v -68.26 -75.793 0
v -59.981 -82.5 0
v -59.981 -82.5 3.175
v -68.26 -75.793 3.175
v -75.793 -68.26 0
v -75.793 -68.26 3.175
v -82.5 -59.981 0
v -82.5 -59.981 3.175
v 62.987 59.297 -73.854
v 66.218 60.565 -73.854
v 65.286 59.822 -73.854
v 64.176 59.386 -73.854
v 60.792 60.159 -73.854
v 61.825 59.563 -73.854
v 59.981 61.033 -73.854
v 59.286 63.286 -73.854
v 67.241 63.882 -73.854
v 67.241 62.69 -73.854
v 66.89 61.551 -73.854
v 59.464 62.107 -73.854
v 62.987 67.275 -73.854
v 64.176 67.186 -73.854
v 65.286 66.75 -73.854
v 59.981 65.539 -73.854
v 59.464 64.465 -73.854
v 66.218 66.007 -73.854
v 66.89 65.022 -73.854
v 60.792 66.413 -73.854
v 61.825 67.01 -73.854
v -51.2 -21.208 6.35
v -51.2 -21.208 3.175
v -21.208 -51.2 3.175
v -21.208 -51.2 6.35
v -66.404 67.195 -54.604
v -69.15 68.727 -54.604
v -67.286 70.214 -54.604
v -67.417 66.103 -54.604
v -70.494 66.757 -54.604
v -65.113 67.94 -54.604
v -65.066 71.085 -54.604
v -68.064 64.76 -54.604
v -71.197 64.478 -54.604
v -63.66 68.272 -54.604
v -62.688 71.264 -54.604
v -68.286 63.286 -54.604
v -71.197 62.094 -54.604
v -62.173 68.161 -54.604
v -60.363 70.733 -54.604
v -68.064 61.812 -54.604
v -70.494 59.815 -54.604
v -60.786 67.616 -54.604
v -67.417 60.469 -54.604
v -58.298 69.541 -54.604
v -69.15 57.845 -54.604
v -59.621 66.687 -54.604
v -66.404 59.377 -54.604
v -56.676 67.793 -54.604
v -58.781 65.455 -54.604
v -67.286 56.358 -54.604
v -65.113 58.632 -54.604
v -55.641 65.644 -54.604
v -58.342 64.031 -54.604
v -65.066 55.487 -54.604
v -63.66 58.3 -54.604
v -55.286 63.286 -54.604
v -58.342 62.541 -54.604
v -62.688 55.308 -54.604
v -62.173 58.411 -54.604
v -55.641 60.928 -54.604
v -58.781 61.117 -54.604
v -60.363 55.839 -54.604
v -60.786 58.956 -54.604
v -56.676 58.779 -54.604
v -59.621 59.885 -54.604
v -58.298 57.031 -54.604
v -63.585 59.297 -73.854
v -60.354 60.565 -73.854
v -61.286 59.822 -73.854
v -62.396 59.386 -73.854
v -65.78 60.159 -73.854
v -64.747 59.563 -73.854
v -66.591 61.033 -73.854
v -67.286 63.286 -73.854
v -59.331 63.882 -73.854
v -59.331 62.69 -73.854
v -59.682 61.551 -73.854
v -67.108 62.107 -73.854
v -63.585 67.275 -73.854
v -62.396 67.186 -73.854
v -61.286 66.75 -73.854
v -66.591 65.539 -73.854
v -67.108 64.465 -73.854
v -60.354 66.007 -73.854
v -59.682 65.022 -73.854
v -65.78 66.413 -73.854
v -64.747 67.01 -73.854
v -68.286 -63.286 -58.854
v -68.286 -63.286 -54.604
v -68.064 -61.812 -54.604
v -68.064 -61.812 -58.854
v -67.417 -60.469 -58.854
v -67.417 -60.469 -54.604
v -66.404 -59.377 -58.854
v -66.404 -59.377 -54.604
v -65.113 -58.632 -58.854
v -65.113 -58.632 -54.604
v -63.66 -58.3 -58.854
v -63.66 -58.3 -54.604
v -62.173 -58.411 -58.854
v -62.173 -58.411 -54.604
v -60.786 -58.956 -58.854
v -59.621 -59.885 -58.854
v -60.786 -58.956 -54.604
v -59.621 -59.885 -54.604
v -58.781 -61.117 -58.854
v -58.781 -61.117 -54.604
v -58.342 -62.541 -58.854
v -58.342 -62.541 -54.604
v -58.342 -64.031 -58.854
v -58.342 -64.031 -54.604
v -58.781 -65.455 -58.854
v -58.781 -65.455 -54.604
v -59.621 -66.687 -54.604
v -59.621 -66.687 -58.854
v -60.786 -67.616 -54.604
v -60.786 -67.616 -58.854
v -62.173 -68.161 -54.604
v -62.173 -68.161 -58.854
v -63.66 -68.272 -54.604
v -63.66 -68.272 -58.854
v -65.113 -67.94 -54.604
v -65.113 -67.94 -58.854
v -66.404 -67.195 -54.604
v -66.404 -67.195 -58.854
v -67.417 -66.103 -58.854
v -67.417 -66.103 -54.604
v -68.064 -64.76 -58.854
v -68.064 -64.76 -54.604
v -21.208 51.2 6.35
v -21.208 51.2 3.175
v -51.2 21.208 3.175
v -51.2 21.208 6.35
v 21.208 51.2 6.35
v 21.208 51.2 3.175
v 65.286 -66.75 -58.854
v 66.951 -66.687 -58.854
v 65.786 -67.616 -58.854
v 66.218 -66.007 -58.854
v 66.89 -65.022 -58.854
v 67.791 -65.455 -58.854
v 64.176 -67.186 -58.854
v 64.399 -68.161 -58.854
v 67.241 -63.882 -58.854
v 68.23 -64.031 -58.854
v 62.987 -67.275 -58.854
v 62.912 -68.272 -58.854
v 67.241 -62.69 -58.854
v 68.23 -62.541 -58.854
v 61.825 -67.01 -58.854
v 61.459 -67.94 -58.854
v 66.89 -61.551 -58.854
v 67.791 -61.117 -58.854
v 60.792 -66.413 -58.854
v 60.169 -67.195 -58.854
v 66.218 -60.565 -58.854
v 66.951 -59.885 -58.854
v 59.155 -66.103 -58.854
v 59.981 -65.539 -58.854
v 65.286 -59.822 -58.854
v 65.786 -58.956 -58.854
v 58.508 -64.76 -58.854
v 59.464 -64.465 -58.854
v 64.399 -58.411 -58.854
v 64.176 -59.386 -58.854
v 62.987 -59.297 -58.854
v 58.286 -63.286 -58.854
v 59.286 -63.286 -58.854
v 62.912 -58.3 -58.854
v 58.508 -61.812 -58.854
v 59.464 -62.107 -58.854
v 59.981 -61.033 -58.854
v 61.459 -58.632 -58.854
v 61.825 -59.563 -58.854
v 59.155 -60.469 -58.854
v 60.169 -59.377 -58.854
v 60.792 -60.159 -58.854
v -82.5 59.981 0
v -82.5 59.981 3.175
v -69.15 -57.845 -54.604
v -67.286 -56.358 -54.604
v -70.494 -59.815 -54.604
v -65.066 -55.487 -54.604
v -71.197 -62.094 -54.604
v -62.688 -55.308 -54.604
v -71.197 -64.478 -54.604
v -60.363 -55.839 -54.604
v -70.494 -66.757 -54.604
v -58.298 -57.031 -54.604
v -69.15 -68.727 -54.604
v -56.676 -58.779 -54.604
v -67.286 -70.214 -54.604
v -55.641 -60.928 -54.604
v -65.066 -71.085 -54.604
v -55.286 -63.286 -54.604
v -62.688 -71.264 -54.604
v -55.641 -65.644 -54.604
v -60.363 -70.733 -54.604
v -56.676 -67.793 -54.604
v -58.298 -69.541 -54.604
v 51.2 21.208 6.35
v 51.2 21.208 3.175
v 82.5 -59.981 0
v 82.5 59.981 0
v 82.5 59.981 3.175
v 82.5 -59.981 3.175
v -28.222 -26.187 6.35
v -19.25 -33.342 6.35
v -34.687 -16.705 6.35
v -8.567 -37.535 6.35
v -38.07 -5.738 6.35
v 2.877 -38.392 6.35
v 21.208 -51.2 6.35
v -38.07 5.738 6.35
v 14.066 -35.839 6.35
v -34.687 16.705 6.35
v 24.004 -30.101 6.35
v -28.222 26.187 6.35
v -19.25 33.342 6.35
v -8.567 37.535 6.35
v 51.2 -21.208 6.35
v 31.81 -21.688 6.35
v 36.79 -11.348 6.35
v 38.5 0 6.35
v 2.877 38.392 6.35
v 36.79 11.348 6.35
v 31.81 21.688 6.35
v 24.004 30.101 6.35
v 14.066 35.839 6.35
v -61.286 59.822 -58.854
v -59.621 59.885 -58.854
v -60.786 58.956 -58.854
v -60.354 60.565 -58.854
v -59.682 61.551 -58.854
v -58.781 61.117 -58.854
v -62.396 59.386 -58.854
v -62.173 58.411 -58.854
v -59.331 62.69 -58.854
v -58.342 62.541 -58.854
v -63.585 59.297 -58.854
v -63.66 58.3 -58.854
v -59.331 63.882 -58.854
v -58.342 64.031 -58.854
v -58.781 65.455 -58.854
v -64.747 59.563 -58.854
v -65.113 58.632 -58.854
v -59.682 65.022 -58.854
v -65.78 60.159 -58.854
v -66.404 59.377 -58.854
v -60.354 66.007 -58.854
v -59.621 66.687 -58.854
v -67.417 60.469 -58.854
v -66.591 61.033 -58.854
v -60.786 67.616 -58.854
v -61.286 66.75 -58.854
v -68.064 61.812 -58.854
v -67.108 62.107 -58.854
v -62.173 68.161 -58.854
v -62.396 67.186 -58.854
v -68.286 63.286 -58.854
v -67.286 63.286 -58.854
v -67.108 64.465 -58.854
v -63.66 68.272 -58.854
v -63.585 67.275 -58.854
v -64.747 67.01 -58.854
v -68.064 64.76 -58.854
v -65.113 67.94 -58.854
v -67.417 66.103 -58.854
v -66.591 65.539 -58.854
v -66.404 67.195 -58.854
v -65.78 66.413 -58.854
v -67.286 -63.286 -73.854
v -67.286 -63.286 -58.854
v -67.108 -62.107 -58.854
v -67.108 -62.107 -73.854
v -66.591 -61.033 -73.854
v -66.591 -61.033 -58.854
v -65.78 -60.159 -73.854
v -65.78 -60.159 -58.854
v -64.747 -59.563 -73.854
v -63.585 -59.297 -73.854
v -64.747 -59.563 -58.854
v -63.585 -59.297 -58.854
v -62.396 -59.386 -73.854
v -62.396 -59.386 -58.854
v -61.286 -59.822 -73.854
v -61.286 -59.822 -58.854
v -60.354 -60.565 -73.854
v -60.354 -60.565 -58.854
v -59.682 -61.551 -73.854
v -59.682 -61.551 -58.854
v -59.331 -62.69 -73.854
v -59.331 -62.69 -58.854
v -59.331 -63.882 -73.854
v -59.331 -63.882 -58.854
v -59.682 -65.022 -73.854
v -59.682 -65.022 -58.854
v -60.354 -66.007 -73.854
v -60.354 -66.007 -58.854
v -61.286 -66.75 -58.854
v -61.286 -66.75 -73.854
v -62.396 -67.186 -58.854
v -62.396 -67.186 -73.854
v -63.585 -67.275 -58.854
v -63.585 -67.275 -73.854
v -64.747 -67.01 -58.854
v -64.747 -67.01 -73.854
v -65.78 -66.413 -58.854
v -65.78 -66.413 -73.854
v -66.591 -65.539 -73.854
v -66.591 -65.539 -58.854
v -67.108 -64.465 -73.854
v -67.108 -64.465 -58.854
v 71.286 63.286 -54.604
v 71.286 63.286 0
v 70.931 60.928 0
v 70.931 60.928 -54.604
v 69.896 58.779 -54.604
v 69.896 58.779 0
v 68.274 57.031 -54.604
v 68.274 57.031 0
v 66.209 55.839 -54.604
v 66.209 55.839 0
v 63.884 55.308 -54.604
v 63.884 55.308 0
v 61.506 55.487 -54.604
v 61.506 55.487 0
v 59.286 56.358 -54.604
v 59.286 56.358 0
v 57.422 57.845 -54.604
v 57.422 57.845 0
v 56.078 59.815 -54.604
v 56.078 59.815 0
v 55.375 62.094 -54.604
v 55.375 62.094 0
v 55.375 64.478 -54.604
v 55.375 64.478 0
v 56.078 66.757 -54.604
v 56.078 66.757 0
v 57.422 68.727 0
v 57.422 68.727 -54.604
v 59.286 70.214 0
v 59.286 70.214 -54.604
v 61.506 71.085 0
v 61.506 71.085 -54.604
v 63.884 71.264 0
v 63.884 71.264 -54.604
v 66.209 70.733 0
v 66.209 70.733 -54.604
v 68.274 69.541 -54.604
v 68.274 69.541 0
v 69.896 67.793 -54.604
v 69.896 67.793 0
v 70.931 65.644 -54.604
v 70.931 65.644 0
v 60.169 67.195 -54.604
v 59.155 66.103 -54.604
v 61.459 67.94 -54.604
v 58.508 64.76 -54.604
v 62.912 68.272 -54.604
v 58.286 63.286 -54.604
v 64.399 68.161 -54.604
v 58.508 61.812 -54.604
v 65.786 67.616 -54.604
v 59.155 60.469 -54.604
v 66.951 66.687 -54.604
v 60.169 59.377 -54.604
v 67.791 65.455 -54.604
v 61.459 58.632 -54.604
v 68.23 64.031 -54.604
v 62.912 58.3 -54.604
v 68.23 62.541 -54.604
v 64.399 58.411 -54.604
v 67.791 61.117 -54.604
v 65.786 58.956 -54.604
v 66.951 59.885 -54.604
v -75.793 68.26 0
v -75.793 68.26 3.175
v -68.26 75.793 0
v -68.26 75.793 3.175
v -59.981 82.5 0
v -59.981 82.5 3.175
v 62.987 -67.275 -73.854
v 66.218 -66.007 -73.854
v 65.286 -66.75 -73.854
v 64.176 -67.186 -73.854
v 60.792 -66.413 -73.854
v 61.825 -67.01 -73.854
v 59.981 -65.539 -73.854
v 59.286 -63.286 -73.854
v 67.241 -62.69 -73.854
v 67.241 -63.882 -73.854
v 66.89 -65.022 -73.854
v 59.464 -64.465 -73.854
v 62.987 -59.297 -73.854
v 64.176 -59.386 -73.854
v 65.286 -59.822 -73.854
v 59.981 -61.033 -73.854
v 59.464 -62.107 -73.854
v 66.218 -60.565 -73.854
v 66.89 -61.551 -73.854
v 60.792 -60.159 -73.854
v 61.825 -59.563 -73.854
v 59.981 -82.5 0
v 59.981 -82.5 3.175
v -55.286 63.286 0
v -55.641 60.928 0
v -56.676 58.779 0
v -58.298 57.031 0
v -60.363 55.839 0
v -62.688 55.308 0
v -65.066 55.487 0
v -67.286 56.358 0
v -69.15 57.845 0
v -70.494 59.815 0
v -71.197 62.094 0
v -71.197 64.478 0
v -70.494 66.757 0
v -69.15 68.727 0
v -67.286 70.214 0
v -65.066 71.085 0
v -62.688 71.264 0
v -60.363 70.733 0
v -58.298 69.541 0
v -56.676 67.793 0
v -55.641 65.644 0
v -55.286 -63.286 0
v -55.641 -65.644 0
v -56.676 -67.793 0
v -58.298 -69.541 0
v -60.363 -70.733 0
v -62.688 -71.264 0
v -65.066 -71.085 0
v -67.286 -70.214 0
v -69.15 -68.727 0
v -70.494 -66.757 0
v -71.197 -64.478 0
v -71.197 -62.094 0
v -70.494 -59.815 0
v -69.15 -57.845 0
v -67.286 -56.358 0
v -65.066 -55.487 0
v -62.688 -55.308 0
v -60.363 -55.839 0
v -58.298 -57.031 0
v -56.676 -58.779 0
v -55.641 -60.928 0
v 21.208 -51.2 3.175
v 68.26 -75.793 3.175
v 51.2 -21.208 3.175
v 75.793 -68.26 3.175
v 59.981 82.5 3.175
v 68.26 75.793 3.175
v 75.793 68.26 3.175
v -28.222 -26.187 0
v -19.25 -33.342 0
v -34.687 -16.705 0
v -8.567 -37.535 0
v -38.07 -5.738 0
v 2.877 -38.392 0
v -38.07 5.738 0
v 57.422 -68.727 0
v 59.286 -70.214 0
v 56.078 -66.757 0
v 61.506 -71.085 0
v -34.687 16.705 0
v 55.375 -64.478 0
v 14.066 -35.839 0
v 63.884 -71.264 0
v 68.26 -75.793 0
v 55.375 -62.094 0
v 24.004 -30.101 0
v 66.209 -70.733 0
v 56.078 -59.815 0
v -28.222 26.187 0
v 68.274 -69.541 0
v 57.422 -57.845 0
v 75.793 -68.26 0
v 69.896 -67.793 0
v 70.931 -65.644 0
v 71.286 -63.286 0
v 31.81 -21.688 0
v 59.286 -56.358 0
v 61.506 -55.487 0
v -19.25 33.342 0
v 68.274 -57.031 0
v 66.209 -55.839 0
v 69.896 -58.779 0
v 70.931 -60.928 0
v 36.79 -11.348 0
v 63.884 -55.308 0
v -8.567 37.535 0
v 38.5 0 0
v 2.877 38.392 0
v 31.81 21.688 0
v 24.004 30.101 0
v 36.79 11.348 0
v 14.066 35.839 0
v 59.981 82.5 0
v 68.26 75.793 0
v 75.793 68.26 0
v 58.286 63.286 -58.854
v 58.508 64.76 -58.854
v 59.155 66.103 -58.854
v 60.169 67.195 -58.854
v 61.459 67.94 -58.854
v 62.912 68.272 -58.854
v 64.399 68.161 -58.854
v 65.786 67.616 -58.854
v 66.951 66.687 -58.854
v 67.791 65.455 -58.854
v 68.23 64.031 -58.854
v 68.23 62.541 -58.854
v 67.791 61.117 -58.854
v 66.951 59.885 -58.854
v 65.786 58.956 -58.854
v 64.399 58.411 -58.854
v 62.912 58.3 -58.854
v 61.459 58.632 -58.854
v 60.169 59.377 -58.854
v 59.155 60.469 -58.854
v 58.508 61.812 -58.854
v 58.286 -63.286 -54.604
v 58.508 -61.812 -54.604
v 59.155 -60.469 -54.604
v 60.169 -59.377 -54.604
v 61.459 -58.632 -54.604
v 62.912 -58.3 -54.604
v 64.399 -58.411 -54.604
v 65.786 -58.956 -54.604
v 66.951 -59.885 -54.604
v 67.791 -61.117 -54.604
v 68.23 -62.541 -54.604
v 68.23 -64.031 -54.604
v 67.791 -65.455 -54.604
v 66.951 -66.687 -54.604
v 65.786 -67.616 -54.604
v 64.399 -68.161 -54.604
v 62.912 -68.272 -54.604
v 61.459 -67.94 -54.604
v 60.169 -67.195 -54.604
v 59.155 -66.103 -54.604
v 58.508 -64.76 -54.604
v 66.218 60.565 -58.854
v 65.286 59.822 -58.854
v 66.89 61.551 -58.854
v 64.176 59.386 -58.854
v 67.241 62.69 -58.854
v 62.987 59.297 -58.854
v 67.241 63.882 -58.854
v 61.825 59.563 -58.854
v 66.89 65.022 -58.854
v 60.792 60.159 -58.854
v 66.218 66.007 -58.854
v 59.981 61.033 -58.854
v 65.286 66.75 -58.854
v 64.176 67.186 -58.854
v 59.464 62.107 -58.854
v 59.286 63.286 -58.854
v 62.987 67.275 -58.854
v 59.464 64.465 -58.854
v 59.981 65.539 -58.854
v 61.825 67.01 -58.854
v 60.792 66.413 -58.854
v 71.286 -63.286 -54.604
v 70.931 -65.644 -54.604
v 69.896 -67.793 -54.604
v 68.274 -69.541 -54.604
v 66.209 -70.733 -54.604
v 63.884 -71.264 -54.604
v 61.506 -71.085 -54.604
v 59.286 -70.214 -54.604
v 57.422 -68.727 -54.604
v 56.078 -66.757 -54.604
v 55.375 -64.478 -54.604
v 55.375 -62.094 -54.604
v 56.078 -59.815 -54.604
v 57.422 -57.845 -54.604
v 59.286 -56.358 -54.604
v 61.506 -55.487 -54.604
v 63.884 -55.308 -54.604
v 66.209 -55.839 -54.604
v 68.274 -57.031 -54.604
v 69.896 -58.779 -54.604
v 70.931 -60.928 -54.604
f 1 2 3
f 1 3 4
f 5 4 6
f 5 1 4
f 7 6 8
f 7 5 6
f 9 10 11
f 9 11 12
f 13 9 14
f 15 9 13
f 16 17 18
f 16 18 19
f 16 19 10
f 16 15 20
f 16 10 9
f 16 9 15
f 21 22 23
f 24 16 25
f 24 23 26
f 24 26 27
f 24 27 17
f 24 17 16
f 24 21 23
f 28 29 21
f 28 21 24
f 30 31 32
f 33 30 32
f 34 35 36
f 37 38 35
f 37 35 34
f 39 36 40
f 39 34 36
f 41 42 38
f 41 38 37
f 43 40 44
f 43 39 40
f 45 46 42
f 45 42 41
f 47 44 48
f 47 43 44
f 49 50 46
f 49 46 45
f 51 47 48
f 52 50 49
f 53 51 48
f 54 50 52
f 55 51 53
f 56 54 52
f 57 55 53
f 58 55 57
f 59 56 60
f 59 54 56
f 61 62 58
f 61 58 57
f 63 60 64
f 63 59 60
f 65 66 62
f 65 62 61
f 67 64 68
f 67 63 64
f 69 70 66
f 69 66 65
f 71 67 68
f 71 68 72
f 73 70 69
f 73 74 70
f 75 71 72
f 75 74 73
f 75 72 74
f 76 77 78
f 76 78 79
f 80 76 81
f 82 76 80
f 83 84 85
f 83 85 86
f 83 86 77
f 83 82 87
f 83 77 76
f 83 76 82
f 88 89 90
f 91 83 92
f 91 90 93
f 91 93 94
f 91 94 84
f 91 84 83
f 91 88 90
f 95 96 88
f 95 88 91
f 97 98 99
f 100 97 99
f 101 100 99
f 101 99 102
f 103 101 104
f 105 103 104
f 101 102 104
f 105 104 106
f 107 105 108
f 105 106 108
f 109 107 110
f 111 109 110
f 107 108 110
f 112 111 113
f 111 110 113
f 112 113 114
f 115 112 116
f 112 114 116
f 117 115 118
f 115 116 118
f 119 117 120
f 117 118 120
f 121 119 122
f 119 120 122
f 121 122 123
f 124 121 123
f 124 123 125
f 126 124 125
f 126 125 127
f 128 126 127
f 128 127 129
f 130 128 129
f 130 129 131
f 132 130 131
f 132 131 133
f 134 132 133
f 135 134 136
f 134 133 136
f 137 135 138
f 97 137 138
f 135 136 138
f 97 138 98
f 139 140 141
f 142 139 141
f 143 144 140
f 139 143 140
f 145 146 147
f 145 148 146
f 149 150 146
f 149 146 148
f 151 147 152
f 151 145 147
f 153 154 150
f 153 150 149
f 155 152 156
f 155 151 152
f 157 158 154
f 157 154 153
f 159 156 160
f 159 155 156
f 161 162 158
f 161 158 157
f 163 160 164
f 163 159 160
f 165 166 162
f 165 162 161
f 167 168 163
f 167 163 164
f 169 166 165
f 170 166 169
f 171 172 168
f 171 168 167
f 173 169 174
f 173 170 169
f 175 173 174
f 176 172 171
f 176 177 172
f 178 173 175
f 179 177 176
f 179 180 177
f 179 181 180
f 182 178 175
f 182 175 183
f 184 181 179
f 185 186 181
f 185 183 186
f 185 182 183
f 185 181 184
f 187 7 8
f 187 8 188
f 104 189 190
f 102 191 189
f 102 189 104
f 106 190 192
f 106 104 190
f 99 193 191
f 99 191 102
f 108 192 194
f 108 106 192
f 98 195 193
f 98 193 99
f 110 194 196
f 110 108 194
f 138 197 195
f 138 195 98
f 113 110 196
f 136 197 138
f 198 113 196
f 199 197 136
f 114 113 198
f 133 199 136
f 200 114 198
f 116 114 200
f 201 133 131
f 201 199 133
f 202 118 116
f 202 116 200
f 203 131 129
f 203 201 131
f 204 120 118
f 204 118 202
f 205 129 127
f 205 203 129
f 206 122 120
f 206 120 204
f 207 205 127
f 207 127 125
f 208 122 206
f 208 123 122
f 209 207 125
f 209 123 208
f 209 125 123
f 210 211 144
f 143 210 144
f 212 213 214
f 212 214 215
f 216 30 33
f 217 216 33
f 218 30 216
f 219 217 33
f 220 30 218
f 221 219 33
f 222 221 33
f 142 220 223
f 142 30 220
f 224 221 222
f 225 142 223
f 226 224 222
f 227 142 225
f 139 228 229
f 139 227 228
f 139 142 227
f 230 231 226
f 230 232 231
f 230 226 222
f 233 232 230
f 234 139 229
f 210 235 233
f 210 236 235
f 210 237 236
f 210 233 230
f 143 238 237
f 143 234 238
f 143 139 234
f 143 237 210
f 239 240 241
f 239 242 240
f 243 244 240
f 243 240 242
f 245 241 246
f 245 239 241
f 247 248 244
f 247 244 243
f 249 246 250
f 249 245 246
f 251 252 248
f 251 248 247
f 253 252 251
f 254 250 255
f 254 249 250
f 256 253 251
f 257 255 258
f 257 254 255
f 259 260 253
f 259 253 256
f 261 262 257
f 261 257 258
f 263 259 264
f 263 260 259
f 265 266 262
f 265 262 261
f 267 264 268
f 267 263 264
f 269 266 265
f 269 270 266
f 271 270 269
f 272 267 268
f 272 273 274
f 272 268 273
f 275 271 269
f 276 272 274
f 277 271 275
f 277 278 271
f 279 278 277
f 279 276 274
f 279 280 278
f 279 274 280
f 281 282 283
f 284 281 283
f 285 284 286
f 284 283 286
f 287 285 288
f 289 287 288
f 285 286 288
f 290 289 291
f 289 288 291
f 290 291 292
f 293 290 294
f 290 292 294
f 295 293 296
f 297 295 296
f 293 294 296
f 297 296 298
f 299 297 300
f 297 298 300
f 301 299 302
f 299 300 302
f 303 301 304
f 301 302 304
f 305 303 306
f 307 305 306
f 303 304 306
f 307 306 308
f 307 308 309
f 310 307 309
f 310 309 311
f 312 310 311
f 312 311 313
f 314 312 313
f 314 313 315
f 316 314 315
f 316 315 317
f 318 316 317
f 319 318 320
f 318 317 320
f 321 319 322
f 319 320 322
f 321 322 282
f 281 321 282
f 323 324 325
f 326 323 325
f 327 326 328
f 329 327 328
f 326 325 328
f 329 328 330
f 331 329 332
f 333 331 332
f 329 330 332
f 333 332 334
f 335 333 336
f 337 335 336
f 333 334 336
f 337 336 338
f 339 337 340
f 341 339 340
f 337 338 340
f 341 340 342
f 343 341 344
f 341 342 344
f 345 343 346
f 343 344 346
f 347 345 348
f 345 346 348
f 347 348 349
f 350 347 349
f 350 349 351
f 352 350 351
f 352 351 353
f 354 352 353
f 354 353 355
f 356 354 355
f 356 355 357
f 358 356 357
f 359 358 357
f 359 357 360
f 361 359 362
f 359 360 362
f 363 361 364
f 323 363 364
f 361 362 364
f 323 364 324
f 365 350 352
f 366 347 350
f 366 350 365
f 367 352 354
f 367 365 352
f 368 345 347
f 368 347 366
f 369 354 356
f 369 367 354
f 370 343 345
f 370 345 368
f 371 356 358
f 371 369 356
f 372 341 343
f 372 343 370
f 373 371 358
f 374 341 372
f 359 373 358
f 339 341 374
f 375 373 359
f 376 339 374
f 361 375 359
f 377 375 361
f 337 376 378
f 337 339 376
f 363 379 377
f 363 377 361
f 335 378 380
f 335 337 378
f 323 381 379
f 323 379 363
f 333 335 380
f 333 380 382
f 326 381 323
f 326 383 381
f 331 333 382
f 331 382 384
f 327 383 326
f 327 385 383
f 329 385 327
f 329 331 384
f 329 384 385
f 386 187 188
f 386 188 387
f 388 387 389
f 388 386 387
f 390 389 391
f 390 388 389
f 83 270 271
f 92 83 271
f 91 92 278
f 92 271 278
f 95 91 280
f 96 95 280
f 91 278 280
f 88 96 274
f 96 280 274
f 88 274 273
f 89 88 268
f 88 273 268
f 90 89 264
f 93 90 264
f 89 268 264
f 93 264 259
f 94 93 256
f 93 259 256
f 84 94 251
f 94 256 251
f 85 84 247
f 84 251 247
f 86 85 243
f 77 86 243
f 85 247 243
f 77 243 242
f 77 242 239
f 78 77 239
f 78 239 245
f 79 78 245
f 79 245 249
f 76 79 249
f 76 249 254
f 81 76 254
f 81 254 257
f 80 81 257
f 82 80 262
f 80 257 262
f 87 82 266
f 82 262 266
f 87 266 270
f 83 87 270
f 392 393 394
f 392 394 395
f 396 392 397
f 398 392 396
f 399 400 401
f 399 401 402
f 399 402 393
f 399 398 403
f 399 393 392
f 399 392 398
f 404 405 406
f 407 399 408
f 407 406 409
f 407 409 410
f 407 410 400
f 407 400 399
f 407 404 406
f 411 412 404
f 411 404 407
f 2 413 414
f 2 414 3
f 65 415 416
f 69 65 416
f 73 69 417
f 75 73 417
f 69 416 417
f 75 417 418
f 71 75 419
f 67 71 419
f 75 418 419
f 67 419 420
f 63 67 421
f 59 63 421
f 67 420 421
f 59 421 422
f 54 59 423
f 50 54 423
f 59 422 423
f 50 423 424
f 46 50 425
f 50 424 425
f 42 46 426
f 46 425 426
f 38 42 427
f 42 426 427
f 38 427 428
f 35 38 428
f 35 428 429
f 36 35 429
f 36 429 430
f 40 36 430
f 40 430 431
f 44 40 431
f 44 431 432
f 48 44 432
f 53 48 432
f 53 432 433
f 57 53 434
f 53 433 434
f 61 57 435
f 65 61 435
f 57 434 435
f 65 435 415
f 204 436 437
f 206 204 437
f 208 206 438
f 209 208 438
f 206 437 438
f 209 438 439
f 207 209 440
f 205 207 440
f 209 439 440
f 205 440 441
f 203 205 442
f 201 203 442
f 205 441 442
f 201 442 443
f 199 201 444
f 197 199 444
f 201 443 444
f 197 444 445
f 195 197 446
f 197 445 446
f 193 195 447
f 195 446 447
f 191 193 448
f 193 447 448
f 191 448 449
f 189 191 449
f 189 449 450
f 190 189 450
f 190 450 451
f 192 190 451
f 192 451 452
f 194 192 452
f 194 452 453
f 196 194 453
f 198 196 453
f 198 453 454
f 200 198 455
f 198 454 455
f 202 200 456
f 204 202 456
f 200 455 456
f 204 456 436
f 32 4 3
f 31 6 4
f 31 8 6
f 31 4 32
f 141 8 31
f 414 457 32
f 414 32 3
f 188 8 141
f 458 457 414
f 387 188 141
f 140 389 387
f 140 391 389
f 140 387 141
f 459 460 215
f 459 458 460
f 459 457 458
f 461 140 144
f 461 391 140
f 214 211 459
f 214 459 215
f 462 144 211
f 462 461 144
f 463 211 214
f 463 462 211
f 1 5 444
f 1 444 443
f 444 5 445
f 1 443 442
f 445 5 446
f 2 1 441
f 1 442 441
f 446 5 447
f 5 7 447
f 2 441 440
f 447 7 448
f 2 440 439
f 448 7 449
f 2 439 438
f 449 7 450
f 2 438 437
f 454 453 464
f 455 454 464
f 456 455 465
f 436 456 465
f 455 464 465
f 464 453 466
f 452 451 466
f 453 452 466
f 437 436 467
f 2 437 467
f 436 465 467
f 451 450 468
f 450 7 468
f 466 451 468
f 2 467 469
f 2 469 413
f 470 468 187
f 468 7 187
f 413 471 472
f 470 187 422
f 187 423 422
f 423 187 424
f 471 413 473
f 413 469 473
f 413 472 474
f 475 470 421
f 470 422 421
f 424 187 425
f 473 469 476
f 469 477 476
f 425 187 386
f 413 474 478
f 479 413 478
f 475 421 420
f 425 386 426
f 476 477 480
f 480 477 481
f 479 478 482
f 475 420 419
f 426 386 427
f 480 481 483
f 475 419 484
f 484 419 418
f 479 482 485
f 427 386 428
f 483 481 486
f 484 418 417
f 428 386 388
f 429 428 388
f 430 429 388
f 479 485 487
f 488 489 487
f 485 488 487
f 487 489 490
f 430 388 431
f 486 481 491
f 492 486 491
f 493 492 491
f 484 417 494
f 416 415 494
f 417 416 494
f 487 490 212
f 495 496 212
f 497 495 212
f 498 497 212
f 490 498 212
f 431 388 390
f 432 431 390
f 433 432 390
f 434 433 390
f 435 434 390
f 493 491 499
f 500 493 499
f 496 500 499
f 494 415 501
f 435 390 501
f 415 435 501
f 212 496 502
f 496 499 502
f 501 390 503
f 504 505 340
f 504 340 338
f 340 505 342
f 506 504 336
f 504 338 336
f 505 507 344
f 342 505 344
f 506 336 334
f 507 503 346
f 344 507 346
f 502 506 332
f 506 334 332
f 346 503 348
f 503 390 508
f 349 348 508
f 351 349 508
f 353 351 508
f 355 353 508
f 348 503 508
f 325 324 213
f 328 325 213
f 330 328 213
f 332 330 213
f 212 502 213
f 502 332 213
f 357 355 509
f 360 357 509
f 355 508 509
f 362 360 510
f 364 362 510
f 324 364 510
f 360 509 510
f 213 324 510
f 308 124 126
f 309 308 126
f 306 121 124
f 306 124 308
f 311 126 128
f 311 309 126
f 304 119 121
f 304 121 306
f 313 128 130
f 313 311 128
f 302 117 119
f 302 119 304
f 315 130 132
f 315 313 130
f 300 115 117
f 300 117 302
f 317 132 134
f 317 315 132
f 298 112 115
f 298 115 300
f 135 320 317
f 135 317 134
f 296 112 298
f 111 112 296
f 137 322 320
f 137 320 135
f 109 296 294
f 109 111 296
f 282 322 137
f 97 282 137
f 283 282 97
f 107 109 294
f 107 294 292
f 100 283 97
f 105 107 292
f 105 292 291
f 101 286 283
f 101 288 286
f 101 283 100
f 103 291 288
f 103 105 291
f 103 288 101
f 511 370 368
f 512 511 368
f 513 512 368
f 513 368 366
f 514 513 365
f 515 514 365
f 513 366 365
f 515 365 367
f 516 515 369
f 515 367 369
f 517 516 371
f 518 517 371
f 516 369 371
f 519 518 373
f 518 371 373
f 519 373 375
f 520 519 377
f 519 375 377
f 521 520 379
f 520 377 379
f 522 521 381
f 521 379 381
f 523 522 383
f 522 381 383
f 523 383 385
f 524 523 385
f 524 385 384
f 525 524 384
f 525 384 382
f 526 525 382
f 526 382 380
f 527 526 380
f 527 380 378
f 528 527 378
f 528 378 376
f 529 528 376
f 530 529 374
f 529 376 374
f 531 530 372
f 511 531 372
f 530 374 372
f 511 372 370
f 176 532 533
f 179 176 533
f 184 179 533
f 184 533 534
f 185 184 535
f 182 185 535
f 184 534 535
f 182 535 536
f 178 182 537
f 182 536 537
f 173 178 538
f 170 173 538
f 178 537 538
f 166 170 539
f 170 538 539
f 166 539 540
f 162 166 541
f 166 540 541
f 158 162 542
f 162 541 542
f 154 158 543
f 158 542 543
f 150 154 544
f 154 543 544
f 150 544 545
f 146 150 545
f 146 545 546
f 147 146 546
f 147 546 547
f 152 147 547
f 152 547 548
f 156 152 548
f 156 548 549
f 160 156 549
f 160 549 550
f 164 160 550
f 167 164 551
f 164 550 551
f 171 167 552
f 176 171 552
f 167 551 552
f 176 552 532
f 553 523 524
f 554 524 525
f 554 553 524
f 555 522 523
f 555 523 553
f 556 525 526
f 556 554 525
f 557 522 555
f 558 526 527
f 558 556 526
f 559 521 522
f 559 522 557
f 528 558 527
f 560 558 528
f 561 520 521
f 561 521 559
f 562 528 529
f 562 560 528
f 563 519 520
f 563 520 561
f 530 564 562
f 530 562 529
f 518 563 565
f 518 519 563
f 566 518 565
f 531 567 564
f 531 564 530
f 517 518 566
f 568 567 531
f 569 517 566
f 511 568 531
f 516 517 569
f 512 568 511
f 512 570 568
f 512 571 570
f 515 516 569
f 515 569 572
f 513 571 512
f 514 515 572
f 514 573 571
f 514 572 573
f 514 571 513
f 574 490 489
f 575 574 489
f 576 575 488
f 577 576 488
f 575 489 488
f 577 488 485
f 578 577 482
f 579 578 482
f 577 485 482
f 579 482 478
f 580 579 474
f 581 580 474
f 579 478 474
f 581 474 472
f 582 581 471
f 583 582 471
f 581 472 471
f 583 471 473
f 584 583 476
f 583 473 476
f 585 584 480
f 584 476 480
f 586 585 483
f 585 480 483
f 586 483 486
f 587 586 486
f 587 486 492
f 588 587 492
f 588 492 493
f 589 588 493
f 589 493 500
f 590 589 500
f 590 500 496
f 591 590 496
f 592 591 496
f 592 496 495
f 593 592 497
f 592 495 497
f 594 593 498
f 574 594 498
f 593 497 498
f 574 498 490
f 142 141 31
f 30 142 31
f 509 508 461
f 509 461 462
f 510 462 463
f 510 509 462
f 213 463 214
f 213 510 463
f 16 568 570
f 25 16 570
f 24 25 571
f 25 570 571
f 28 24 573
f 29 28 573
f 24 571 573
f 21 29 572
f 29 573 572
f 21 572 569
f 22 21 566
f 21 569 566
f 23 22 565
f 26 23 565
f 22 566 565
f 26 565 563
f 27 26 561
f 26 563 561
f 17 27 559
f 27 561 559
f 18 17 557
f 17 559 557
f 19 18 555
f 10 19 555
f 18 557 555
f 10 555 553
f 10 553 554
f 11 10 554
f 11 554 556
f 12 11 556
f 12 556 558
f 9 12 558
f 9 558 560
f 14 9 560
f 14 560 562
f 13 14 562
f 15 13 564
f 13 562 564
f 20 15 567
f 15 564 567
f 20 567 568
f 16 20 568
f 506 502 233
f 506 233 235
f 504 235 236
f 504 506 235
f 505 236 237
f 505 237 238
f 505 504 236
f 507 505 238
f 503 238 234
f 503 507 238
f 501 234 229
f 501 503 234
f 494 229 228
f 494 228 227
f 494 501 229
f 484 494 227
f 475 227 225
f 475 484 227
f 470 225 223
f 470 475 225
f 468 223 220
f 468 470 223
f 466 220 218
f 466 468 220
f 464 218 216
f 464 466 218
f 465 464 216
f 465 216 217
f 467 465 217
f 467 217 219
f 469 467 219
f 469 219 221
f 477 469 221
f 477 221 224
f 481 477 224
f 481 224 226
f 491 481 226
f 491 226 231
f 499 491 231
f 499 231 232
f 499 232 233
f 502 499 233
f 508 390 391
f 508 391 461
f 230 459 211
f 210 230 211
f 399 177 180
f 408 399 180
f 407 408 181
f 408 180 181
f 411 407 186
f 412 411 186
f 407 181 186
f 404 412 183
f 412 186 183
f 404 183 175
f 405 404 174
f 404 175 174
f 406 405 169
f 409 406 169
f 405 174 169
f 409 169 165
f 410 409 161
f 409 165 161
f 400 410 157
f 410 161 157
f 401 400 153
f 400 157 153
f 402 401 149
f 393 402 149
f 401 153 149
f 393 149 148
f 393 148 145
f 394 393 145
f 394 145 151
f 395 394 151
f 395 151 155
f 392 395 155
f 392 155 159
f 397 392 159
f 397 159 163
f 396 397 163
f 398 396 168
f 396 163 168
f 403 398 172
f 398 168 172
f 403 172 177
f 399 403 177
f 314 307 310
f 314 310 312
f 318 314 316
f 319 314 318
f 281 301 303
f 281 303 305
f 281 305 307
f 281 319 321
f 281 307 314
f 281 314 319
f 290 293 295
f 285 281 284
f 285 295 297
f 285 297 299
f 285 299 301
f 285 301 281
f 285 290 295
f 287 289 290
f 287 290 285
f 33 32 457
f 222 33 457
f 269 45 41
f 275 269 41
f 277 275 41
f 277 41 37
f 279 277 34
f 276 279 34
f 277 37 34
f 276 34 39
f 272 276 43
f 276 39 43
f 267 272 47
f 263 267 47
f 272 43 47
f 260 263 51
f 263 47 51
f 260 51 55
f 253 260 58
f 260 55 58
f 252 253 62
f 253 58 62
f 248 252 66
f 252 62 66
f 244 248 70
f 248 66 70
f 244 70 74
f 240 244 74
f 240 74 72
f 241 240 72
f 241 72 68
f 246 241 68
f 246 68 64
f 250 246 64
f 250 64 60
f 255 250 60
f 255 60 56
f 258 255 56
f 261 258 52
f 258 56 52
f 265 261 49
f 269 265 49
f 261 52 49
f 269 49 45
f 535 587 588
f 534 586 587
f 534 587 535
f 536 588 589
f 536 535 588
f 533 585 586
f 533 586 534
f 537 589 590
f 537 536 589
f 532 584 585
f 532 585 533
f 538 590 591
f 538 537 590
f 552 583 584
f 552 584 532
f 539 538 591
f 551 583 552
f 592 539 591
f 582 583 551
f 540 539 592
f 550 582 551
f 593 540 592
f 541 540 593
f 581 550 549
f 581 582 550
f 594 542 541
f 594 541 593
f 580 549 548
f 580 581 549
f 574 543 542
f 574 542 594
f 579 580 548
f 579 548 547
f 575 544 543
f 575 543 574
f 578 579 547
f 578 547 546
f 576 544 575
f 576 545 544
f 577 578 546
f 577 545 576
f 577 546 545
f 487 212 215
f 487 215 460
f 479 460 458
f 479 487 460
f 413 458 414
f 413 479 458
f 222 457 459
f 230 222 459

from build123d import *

# Parameters (mm, degrees)
SKETCH1_W           = 203.947710216
SKETCH1_H           = 203.947710216
SKETCH1_R           = 38.5
BOSS_EXTRUDE1_DEPTH = 3.175
SKETCH1_3_R         = 38.5
BOSS_EXTRUDE2_DEPTH = 6.35
SKETCH2_R           = 8
BOSS_EXTRUDE3_DEPTH = 54.60355498
SKETCH3_R           = 5
BOSS_EXTRUDE4_DEPTH = 4.25
SKETCH4_R           = 4
BOSS_EXTRUDE5_DEPTH = 15
SKETCH6_W           = 203.947710216
SKETCH6_H           = 203.947710216
CUT_EXTRUDE1_DEPTH  = 15


with BuildPart() as part:
    # Sketch1 → Boss-Extrude1 (new body)
    with BuildSketch(Plane.XY):
        Rectangle(SKETCH1_W, SKETCH1_H)
        Polygon((51.2, 21.207734394), (21.207734394, 51.2), (-21.207734394, 51.2), (-51.2, 21.207734394), (-51.2, -21.207734394), (-21.207734394, -51.2), (21.207734394, -51.2), (51.2, -21.207734394), align=None, mode=Mode.SUBTRACT)
        Polygon((51.2, -21.207734394), (51.2, 21.207734394), (21.207734394, 51.2), (-21.207734394, 51.2), (-51.2, 21.207734394), (-51.2, -21.207734394), (-21.207734394, -51.2), (21.207734394, -51.2), align=None)
        Circle(SKETCH1_R, mode=Mode.SUBTRACT)
    extrude(amount=BOSS_EXTRUDE1_DEPTH)

    # Sketch1<3> → Boss-Extrude2 (add)
    with BuildSketch(Plane.XY):
        Polygon((51.2, -21.207734394), (51.2, 21.207734394), (21.207734394, 51.2), (-21.207734394, 51.2), (-51.2, 21.207734394), (-51.2, -21.207734394), (-21.207734394, -51.2), (21.207734394, -51.2), align=None)
        Circle(SKETCH1_3_R, mode=Mode.SUBTRACT)
    extrude(amount=BOSS_EXTRUDE2_DEPTH)

    # Sketch2 → Boss-Extrude3 (add)
    with BuildSketch(Plane(origin=(0, 0, 0), x_dir=(-1, 0, 0), z_dir=(0, 0, -1))):
        with Locations(Location((-63.286056916, 63.286056916, 0), (0, 0, 180))):
            Circle(SKETCH2_R)
    boss_extrude3 = extrude(amount=BOSS_EXTRUDE3_DEPTH)

    # Sketch3 → Boss-Extrude4 (add)
    with BuildSketch(Plane(origin=(0, 0, -54.60355498), x_dir=(-1, 0, 0), z_dir=(0, 0, -1))):
        with Locations((-63.286056916, 63.286056916)):
            Circle(SKETCH3_R)
    boss_extrude4 = extrude(amount=BOSS_EXTRUDE4_DEPTH)

    # Sketch4 → Boss-Extrude5 (add)
    with BuildSketch(Plane(origin=(0, 0, -58.85355498), x_dir=(-1, 0, 0), z_dir=(0, 0, -1))):
        with Locations((-63.286056916, 63.286056916)):
            Circle(SKETCH4_R)
    boss_extrude5 = extrude(amount=BOSS_EXTRUDE5_DEPTH)

    # Sketch-Pattern1: Boss-Extrude3, Boss-Extrude4, Boss-Extrude5 at 3 more places
    with Locations((-126.572114, 0, 0), (-126.572114, -126.572114, 0), (0, -126.572114, 0)):
        add(boss_extrude3)
        add(boss_extrude4)
        add(boss_extrude5)

    # Sketch6 → Cut-Extrude1 (cut)
    with BuildSketch(Plane(origin=(0, 0, 0), x_dir=(-1, 0, 0), z_dir=(0, 0, -1))):
        Rectangle(SKETCH6_W, SKETCH6_H)
        with BuildLine():
            ThreePointArc((-59.981247069, 82.5), (-72.124891681, 72.124891681), (-82.5, 59.981247069))
            Line((-82.5, 59.981247069), (-82.5, -59.981247069))
            ThreePointArc((-82.5, -59.981247069), (-72.124891681, -72.124891681), (-59.981247069, -82.5))
            Line((-59.981247069, -82.5), (59.981247069, -82.5))
            ThreePointArc((59.981247069, -82.5), (72.124891681, -72.124891681), (82.5, -59.981247069))
            Line((82.5, -59.981247069), (82.5, 59.981247069))
            ThreePointArc((82.5, 59.981247069), (72.124891681, 72.124891681), (59.981247069, 82.5))
            Line((59.981247069, 82.5), (-59.981247069, 82.5))
        make_face(mode=Mode.SUBTRACT)
    extrude(amount=-CUT_EXTRUDE1_DEPTH, mode=Mode.SUBTRACT)


solid = part.part
